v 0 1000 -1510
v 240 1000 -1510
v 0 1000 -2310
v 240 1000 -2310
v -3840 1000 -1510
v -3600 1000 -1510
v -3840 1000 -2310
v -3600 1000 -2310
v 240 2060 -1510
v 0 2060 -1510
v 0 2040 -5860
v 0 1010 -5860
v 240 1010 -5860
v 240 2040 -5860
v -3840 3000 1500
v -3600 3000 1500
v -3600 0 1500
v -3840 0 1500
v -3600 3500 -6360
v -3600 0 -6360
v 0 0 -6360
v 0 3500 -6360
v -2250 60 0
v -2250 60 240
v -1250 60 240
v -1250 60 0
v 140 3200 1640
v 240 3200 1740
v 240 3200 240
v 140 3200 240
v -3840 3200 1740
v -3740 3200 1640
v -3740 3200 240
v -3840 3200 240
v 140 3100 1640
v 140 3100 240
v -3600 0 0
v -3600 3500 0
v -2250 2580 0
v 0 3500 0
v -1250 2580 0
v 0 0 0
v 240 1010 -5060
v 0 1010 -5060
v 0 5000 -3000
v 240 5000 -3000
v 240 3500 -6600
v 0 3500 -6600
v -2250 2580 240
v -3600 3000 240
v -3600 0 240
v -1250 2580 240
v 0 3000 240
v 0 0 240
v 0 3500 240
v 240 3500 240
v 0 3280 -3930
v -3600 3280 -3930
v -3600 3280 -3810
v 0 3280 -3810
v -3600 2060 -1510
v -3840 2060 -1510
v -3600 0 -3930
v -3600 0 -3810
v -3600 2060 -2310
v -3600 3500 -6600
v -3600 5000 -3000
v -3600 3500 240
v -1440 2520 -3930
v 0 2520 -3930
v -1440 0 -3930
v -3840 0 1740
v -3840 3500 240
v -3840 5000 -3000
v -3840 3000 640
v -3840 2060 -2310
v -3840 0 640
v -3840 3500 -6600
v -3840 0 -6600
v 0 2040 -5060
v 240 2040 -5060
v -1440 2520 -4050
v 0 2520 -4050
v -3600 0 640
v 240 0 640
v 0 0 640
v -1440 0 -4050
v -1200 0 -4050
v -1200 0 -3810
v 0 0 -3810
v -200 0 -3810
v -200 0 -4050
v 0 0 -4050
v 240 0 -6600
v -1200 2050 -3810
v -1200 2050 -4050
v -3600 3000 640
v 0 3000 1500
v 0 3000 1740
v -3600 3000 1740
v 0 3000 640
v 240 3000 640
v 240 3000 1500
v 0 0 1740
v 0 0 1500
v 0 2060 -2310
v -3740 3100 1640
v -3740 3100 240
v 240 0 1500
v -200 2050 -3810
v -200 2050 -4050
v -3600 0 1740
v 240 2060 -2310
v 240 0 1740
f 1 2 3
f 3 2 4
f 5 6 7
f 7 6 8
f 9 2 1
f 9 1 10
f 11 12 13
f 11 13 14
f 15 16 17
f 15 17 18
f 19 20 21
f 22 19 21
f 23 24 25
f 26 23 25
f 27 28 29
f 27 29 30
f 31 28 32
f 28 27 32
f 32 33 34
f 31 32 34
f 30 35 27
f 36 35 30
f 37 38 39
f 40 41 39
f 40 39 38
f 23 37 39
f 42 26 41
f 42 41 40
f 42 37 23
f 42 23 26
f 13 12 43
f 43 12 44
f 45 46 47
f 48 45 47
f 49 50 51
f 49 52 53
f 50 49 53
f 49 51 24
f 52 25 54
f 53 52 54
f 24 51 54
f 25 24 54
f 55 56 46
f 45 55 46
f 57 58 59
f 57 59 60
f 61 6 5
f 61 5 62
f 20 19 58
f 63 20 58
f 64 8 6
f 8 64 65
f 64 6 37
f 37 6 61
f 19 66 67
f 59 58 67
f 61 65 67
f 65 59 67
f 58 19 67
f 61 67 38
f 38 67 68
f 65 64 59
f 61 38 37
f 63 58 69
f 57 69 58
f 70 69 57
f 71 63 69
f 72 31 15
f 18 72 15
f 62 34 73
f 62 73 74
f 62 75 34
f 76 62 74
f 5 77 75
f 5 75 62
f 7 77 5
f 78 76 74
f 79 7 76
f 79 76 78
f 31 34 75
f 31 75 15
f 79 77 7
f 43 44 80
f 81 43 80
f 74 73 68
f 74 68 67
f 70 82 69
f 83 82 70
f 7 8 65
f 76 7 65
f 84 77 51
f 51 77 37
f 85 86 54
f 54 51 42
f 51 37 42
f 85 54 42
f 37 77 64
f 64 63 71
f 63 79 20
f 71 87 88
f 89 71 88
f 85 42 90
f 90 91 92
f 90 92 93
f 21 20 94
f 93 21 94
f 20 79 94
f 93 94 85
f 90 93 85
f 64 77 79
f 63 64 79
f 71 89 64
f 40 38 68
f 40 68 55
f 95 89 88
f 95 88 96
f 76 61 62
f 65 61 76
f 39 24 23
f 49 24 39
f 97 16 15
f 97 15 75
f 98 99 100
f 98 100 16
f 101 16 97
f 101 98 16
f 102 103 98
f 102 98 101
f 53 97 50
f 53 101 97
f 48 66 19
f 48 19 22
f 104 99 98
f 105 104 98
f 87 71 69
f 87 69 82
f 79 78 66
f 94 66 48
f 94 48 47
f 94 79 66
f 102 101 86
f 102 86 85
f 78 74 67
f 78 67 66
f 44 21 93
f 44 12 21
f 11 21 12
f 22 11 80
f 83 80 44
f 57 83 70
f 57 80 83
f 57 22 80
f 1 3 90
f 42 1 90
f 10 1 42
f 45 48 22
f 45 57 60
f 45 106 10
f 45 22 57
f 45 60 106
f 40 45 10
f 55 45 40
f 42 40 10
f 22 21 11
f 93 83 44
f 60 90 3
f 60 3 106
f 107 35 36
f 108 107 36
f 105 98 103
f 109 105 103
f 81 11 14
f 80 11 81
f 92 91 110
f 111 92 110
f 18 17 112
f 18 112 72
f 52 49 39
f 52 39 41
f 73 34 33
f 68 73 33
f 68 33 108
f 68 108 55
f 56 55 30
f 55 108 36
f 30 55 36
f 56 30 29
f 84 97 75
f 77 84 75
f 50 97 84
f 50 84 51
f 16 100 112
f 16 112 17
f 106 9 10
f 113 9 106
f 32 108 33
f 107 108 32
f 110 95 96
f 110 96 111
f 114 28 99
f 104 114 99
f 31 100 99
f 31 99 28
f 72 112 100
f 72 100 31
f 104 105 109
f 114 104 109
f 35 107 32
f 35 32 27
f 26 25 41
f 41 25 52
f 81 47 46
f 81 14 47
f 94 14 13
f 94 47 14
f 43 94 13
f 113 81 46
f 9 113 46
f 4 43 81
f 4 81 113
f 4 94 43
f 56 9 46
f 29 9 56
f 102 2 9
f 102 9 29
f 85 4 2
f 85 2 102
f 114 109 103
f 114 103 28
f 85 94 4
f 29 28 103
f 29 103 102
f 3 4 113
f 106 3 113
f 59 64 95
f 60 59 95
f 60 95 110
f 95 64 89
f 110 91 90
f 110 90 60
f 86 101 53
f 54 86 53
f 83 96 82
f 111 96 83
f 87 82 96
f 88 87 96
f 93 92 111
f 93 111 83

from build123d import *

# Parameters (mm, degrees)
SKETCH_1_W             = 4080
SKETCH_1_H             = 6840
SKETCH_1_W_2           = 3600
SKETCH_1_H_2           = 6360
EXTRUDE_525_DEPTH      = 3500
EXTRUDE_763_DEPTH      = 240
SKETCH_6_W             = 3600
SKETCH_6_H             = 120
EXTRUDE_1086_DEPTH     = 3280
SKETCH_12_W            = 1440
SKETCH_12_H            = 120
EXTRUDE_1316_DEPTH     = 2520
CUT_EXTRUDE_1552_REACH = 2792
SKETCH_10_W            = 1000
SKETCH_10_H            = 2050
SKETCH_4_W             = 800
SKETCH_4_H             = 1030
CUT_EXTRUDE_1996_DEPTH = 241
CUT_EXTRUDE_2338_REACH = 6842
SKETCH_13_W            = 1000
SKETCH_13_H            = 2520
SKETCH_15_W            = 1500
SKETCH_15_H            = 100
EXTRUDE_2583_DEPTH     = 4080
SKETCH_16_W            = 240
SKETCH_16_H            = 400
SKETCH_16_H_2          = 240
EXTRUDE_2839_DEPTH     = 3100
EXTRUDE_3047_DEPTH     = 100
SKETCH_18_W            = 800
SKETCH_18_H            = 1060
CUT_EXTRUDE_3409_DEPTH = 4081


with BuildPart() as part:
    # 草图1 → Extrude 525 (new body)
    with BuildSketch(Plane(origin=(0, 0, 0), x_dir=(1, 0, 0), z_dir=(0, 1, 0))):
        with Locations((-1800, 3180)):
            Rectangle(SKETCH_1_W, SKETCH_1_H)
        with Locations((-1800, 3180)):
            Rectangle(SKETCH_1_W_2, SKETCH_1_H_2, mode=Mode.SUBTRACT)
    extrude(amount=EXTRUDE_525_DEPTH)

    # 草图14 → Extrude 763 (add)
    with BuildSketch(Plane(origin=(240, 0, 0), x_dir=(0, 0, -1), z_dir=(1, 0, 0))):
        Polygon((-240, 3500), (3000, 5000), (6600, 3500), align=None)
    extrude_763 = extrude(amount=-EXTRUDE_763_DEPTH)

    # 镜向1: Extrude 763 across plane
    add(extrude_763.mirror(Plane(origin=(-1800, 0, 0), x_dir=(0, 0, 1), z_dir=(1, 0, 0))))

    # 草图6 → Extrude 1086 (add)
    with BuildSketch(Plane(origin=(0, 0, 0), x_dir=(1, 0, 0), z_dir=(0, 1, 0))):
        with Locations((-1800, 3870)):
            Rectangle(SKETCH_6_W, SKETCH_6_H)
    extrude(amount=EXTRUDE_1086_DEPTH)

    # 草图12 → Extrude 1316 (add)
    with BuildSketch(Plane(origin=(0, 0, 0), x_dir=(1, 0, 0), z_dir=(0, 1, 0))):
        with Locations((-720, 3990)):
            Rectangle(SKETCH_12_W, SKETCH_12_H)
    extrude(amount=EXTRUDE_1316_DEPTH)

    # 草图10 → Cut-Extrude 1552 (cut, up to next)
    with BuildSketch(Plane.XY.offset(-3810), mode=Mode.PRIVATE) as cut_extrude_1552_sk1:
        with Locations((-700, 1025)):
            Rectangle(SKETCH_10_W, SKETCH_10_H)
    cut_extrude_1552_tool1 = extrude(cut_extrude_1552_sk1.sketch, amount=-CUT_EXTRUDE_1552_REACH, mode=Mode.PRIVATE) & part.part
    add(cut_extrude_1552_tool1.solids().sort_by_distance((-700, 1025, -3810))[0], mode=Mode.SUBTRACT)

    # 草图4 → Cut-Extrude 1996 (cut, through all)
    with BuildSketch(Plane(origin=(0, 0, -11000), x_dir=(0, 0, 1), z_dir=(-1, 0, 0))):
        with Locations((5540, 1525)):
            Rectangle(SKETCH_4_W, SKETCH_4_H)
    extrude(amount=-CUT_EXTRUDE_1996_DEPTH, mode=Mode.SUBTRACT)

    # 草图13 → Cut-Extrude 2338 (cut, up to next)
    with BuildSketch(Plane.XY.offset(240), mode=Mode.PRIVATE) as cut_extrude_2338_sk1:
        with Locations((-1750, 1320)):
            Rectangle(SKETCH_13_W, SKETCH_13_H)
    cut_extrude_2338_tool1 = extrude(cut_extrude_2338_sk1.sketch, amount=-CUT_EXTRUDE_2338_REACH, mode=Mode.PRIVATE) & part.part
    add(cut_extrude_2338_tool1.solids().sort_by_distance((-1750, 1320, 240))[0], mode=Mode.SUBTRACT)

    # 草图15 → Extrude 2583 (add)
    with BuildSketch(Plane(origin=(240, 0, 0), x_dir=(0, 0, -1), z_dir=(1, 0, 0))):
        with Locations((-990, 3050)):
            Rectangle(SKETCH_15_W, SKETCH_15_H)
    extrude(amount=-EXTRUDE_2583_DEPTH)

    # 草图16 → Extrude 2839 (add)
    with BuildSketch(Plane(origin=(0, 3100, 0), x_dir=(1, 0, 0), z_dir=(0, 1, 0))):
        with Locations((120, -440)):
            Rectangle(SKETCH_16_W, SKETCH_16_H)
        with Locations((120, -1620)):
            Rectangle(SKETCH_16_W, SKETCH_16_H_2)
    extrude_2839 = extrude(amount=-EXTRUDE_2839_DEPTH)

    # Mirror 2899: Extrude 2839 across plane
    add(extrude_2839.mirror(Plane(origin=(-1800, 0, 0), x_dir=(0, 0, 1), z_dir=(1, 0, 0))))

    # 草图17 → Extrude 3047 (add)
    with BuildSketch(Plane(origin=(0, 3100, 0), x_dir=(1, 0, 0), z_dir=(0, 1, 0))):
        Polygon((240, -240), (240, -1740), (-3840, -1740), (-3840, -240), (-3740, -240), (-3740, -1640), (140, -1640), (140, -240), align=None)
    extrude(amount=EXTRUDE_3047_DEPTH)

    # 草图18 → Cut-Extrude 3409 (cut, through all)
    with BuildSketch(Plane(origin=(240, 0, 0), x_dir=(0, 0, -1), z_dir=(1, 0, 0))):
        with Locations((1910, 1530)):
            Rectangle(SKETCH_18_W, SKETCH_18_H)
    extrude(amount=-CUT_EXTRUDE_3409_DEPTH, mode=Mode.SUBTRACT)


solid = part.part
